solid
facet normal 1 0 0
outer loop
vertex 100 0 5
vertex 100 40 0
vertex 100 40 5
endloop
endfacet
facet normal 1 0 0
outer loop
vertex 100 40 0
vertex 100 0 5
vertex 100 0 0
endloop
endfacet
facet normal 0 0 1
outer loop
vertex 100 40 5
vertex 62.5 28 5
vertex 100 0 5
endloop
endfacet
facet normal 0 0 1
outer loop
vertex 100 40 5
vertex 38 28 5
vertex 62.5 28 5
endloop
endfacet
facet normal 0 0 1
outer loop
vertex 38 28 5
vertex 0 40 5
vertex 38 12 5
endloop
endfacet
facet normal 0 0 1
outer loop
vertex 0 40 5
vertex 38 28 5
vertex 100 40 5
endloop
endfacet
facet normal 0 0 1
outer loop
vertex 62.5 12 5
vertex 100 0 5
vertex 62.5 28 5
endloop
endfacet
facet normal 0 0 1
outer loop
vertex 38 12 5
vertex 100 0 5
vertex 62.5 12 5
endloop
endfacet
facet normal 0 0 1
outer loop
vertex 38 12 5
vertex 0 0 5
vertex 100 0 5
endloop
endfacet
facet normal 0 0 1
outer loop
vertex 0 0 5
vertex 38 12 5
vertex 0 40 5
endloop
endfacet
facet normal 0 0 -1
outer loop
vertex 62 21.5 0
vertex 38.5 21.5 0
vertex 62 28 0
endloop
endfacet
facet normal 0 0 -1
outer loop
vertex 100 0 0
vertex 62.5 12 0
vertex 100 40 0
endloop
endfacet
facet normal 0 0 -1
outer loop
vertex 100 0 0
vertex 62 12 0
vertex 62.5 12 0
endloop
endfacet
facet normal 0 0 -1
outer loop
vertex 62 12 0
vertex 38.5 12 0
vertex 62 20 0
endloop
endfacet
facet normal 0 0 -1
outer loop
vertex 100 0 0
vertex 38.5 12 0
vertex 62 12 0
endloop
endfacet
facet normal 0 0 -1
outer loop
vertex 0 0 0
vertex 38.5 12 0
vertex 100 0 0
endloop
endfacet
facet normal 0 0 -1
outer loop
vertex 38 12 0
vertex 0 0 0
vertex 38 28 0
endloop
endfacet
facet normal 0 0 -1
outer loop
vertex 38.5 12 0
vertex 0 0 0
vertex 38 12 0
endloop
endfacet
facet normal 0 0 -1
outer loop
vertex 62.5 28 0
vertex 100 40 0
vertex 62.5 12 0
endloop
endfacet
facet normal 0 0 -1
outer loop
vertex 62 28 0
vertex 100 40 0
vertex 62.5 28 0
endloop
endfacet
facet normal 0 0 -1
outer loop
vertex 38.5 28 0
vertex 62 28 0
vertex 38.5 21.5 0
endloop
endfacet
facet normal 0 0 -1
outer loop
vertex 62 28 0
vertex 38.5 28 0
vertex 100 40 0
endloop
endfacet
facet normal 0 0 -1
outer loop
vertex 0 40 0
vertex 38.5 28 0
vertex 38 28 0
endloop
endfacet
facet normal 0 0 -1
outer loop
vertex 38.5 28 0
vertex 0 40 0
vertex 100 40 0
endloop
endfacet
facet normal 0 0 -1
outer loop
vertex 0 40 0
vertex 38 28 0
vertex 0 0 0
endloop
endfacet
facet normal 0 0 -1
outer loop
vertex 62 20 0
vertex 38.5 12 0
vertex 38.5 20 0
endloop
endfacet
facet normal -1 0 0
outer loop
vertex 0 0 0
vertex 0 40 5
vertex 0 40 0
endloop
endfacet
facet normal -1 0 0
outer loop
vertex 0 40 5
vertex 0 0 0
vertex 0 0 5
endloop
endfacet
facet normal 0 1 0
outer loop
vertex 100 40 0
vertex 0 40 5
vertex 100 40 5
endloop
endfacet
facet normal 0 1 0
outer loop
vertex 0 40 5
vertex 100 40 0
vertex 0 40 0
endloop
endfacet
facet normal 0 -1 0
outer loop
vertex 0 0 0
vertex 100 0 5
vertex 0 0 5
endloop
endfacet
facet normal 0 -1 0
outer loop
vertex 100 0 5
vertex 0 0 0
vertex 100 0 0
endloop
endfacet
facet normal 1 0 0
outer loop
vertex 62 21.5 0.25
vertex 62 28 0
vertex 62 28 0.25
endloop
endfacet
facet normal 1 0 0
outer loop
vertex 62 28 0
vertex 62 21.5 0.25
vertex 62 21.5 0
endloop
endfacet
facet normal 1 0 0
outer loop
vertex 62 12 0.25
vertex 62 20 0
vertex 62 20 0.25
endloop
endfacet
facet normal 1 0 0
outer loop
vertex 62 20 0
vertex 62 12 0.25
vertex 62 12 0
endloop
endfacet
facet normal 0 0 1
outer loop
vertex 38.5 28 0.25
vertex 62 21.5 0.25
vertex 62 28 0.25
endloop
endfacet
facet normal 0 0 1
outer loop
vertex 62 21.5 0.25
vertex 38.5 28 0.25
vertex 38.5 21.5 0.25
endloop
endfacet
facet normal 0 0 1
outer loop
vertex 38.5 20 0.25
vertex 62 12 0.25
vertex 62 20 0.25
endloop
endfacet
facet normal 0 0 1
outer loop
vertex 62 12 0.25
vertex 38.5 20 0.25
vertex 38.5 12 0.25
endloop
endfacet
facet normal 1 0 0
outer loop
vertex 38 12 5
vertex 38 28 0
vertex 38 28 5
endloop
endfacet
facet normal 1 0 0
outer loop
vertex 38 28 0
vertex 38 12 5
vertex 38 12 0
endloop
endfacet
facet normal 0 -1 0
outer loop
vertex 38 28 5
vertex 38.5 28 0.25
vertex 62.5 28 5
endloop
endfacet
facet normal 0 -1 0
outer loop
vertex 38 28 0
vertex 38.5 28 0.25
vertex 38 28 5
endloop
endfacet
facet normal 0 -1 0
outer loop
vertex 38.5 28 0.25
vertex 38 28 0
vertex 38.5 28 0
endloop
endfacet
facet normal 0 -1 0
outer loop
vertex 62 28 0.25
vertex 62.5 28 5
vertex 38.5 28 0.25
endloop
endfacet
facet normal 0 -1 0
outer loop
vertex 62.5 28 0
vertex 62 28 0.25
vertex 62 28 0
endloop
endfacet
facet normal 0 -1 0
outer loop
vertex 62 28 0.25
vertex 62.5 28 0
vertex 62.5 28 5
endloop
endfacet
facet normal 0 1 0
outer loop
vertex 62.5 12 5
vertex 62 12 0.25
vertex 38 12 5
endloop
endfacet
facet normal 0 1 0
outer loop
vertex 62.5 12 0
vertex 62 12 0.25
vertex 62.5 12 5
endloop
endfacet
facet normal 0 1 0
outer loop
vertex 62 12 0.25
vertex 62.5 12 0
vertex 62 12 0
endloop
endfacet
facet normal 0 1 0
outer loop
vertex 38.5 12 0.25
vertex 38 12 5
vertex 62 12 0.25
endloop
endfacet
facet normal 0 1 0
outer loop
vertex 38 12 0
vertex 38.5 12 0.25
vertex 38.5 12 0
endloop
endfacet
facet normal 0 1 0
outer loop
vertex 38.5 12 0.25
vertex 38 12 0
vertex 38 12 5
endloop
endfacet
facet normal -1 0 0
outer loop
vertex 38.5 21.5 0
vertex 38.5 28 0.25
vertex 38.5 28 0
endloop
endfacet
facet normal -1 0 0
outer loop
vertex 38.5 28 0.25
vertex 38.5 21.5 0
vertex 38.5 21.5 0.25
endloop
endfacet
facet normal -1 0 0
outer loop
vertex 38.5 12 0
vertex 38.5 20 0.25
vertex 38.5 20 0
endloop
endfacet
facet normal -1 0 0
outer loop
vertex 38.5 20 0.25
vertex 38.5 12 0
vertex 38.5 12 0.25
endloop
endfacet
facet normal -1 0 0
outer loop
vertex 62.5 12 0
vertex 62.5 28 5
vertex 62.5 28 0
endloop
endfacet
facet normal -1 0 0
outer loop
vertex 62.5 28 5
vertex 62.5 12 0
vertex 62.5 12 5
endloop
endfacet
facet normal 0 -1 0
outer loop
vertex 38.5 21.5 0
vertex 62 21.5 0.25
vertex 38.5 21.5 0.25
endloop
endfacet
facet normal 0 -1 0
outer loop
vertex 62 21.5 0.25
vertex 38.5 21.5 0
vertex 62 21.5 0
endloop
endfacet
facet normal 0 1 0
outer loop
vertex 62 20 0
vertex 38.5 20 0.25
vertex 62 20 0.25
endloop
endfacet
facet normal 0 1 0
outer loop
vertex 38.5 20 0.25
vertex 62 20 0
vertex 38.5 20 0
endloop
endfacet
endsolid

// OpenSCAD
difference()
{
  cube([100,40,5]);
  translate([38,12,0.25]) cube([24,16,5]);
  translate([38,12,-1]) cube([0.5,16,8]);
  translate([62,12,-1]) cube([0.5,16,8]);
  translate([38,20,-1]) cube([24,1.5,8]);
}
